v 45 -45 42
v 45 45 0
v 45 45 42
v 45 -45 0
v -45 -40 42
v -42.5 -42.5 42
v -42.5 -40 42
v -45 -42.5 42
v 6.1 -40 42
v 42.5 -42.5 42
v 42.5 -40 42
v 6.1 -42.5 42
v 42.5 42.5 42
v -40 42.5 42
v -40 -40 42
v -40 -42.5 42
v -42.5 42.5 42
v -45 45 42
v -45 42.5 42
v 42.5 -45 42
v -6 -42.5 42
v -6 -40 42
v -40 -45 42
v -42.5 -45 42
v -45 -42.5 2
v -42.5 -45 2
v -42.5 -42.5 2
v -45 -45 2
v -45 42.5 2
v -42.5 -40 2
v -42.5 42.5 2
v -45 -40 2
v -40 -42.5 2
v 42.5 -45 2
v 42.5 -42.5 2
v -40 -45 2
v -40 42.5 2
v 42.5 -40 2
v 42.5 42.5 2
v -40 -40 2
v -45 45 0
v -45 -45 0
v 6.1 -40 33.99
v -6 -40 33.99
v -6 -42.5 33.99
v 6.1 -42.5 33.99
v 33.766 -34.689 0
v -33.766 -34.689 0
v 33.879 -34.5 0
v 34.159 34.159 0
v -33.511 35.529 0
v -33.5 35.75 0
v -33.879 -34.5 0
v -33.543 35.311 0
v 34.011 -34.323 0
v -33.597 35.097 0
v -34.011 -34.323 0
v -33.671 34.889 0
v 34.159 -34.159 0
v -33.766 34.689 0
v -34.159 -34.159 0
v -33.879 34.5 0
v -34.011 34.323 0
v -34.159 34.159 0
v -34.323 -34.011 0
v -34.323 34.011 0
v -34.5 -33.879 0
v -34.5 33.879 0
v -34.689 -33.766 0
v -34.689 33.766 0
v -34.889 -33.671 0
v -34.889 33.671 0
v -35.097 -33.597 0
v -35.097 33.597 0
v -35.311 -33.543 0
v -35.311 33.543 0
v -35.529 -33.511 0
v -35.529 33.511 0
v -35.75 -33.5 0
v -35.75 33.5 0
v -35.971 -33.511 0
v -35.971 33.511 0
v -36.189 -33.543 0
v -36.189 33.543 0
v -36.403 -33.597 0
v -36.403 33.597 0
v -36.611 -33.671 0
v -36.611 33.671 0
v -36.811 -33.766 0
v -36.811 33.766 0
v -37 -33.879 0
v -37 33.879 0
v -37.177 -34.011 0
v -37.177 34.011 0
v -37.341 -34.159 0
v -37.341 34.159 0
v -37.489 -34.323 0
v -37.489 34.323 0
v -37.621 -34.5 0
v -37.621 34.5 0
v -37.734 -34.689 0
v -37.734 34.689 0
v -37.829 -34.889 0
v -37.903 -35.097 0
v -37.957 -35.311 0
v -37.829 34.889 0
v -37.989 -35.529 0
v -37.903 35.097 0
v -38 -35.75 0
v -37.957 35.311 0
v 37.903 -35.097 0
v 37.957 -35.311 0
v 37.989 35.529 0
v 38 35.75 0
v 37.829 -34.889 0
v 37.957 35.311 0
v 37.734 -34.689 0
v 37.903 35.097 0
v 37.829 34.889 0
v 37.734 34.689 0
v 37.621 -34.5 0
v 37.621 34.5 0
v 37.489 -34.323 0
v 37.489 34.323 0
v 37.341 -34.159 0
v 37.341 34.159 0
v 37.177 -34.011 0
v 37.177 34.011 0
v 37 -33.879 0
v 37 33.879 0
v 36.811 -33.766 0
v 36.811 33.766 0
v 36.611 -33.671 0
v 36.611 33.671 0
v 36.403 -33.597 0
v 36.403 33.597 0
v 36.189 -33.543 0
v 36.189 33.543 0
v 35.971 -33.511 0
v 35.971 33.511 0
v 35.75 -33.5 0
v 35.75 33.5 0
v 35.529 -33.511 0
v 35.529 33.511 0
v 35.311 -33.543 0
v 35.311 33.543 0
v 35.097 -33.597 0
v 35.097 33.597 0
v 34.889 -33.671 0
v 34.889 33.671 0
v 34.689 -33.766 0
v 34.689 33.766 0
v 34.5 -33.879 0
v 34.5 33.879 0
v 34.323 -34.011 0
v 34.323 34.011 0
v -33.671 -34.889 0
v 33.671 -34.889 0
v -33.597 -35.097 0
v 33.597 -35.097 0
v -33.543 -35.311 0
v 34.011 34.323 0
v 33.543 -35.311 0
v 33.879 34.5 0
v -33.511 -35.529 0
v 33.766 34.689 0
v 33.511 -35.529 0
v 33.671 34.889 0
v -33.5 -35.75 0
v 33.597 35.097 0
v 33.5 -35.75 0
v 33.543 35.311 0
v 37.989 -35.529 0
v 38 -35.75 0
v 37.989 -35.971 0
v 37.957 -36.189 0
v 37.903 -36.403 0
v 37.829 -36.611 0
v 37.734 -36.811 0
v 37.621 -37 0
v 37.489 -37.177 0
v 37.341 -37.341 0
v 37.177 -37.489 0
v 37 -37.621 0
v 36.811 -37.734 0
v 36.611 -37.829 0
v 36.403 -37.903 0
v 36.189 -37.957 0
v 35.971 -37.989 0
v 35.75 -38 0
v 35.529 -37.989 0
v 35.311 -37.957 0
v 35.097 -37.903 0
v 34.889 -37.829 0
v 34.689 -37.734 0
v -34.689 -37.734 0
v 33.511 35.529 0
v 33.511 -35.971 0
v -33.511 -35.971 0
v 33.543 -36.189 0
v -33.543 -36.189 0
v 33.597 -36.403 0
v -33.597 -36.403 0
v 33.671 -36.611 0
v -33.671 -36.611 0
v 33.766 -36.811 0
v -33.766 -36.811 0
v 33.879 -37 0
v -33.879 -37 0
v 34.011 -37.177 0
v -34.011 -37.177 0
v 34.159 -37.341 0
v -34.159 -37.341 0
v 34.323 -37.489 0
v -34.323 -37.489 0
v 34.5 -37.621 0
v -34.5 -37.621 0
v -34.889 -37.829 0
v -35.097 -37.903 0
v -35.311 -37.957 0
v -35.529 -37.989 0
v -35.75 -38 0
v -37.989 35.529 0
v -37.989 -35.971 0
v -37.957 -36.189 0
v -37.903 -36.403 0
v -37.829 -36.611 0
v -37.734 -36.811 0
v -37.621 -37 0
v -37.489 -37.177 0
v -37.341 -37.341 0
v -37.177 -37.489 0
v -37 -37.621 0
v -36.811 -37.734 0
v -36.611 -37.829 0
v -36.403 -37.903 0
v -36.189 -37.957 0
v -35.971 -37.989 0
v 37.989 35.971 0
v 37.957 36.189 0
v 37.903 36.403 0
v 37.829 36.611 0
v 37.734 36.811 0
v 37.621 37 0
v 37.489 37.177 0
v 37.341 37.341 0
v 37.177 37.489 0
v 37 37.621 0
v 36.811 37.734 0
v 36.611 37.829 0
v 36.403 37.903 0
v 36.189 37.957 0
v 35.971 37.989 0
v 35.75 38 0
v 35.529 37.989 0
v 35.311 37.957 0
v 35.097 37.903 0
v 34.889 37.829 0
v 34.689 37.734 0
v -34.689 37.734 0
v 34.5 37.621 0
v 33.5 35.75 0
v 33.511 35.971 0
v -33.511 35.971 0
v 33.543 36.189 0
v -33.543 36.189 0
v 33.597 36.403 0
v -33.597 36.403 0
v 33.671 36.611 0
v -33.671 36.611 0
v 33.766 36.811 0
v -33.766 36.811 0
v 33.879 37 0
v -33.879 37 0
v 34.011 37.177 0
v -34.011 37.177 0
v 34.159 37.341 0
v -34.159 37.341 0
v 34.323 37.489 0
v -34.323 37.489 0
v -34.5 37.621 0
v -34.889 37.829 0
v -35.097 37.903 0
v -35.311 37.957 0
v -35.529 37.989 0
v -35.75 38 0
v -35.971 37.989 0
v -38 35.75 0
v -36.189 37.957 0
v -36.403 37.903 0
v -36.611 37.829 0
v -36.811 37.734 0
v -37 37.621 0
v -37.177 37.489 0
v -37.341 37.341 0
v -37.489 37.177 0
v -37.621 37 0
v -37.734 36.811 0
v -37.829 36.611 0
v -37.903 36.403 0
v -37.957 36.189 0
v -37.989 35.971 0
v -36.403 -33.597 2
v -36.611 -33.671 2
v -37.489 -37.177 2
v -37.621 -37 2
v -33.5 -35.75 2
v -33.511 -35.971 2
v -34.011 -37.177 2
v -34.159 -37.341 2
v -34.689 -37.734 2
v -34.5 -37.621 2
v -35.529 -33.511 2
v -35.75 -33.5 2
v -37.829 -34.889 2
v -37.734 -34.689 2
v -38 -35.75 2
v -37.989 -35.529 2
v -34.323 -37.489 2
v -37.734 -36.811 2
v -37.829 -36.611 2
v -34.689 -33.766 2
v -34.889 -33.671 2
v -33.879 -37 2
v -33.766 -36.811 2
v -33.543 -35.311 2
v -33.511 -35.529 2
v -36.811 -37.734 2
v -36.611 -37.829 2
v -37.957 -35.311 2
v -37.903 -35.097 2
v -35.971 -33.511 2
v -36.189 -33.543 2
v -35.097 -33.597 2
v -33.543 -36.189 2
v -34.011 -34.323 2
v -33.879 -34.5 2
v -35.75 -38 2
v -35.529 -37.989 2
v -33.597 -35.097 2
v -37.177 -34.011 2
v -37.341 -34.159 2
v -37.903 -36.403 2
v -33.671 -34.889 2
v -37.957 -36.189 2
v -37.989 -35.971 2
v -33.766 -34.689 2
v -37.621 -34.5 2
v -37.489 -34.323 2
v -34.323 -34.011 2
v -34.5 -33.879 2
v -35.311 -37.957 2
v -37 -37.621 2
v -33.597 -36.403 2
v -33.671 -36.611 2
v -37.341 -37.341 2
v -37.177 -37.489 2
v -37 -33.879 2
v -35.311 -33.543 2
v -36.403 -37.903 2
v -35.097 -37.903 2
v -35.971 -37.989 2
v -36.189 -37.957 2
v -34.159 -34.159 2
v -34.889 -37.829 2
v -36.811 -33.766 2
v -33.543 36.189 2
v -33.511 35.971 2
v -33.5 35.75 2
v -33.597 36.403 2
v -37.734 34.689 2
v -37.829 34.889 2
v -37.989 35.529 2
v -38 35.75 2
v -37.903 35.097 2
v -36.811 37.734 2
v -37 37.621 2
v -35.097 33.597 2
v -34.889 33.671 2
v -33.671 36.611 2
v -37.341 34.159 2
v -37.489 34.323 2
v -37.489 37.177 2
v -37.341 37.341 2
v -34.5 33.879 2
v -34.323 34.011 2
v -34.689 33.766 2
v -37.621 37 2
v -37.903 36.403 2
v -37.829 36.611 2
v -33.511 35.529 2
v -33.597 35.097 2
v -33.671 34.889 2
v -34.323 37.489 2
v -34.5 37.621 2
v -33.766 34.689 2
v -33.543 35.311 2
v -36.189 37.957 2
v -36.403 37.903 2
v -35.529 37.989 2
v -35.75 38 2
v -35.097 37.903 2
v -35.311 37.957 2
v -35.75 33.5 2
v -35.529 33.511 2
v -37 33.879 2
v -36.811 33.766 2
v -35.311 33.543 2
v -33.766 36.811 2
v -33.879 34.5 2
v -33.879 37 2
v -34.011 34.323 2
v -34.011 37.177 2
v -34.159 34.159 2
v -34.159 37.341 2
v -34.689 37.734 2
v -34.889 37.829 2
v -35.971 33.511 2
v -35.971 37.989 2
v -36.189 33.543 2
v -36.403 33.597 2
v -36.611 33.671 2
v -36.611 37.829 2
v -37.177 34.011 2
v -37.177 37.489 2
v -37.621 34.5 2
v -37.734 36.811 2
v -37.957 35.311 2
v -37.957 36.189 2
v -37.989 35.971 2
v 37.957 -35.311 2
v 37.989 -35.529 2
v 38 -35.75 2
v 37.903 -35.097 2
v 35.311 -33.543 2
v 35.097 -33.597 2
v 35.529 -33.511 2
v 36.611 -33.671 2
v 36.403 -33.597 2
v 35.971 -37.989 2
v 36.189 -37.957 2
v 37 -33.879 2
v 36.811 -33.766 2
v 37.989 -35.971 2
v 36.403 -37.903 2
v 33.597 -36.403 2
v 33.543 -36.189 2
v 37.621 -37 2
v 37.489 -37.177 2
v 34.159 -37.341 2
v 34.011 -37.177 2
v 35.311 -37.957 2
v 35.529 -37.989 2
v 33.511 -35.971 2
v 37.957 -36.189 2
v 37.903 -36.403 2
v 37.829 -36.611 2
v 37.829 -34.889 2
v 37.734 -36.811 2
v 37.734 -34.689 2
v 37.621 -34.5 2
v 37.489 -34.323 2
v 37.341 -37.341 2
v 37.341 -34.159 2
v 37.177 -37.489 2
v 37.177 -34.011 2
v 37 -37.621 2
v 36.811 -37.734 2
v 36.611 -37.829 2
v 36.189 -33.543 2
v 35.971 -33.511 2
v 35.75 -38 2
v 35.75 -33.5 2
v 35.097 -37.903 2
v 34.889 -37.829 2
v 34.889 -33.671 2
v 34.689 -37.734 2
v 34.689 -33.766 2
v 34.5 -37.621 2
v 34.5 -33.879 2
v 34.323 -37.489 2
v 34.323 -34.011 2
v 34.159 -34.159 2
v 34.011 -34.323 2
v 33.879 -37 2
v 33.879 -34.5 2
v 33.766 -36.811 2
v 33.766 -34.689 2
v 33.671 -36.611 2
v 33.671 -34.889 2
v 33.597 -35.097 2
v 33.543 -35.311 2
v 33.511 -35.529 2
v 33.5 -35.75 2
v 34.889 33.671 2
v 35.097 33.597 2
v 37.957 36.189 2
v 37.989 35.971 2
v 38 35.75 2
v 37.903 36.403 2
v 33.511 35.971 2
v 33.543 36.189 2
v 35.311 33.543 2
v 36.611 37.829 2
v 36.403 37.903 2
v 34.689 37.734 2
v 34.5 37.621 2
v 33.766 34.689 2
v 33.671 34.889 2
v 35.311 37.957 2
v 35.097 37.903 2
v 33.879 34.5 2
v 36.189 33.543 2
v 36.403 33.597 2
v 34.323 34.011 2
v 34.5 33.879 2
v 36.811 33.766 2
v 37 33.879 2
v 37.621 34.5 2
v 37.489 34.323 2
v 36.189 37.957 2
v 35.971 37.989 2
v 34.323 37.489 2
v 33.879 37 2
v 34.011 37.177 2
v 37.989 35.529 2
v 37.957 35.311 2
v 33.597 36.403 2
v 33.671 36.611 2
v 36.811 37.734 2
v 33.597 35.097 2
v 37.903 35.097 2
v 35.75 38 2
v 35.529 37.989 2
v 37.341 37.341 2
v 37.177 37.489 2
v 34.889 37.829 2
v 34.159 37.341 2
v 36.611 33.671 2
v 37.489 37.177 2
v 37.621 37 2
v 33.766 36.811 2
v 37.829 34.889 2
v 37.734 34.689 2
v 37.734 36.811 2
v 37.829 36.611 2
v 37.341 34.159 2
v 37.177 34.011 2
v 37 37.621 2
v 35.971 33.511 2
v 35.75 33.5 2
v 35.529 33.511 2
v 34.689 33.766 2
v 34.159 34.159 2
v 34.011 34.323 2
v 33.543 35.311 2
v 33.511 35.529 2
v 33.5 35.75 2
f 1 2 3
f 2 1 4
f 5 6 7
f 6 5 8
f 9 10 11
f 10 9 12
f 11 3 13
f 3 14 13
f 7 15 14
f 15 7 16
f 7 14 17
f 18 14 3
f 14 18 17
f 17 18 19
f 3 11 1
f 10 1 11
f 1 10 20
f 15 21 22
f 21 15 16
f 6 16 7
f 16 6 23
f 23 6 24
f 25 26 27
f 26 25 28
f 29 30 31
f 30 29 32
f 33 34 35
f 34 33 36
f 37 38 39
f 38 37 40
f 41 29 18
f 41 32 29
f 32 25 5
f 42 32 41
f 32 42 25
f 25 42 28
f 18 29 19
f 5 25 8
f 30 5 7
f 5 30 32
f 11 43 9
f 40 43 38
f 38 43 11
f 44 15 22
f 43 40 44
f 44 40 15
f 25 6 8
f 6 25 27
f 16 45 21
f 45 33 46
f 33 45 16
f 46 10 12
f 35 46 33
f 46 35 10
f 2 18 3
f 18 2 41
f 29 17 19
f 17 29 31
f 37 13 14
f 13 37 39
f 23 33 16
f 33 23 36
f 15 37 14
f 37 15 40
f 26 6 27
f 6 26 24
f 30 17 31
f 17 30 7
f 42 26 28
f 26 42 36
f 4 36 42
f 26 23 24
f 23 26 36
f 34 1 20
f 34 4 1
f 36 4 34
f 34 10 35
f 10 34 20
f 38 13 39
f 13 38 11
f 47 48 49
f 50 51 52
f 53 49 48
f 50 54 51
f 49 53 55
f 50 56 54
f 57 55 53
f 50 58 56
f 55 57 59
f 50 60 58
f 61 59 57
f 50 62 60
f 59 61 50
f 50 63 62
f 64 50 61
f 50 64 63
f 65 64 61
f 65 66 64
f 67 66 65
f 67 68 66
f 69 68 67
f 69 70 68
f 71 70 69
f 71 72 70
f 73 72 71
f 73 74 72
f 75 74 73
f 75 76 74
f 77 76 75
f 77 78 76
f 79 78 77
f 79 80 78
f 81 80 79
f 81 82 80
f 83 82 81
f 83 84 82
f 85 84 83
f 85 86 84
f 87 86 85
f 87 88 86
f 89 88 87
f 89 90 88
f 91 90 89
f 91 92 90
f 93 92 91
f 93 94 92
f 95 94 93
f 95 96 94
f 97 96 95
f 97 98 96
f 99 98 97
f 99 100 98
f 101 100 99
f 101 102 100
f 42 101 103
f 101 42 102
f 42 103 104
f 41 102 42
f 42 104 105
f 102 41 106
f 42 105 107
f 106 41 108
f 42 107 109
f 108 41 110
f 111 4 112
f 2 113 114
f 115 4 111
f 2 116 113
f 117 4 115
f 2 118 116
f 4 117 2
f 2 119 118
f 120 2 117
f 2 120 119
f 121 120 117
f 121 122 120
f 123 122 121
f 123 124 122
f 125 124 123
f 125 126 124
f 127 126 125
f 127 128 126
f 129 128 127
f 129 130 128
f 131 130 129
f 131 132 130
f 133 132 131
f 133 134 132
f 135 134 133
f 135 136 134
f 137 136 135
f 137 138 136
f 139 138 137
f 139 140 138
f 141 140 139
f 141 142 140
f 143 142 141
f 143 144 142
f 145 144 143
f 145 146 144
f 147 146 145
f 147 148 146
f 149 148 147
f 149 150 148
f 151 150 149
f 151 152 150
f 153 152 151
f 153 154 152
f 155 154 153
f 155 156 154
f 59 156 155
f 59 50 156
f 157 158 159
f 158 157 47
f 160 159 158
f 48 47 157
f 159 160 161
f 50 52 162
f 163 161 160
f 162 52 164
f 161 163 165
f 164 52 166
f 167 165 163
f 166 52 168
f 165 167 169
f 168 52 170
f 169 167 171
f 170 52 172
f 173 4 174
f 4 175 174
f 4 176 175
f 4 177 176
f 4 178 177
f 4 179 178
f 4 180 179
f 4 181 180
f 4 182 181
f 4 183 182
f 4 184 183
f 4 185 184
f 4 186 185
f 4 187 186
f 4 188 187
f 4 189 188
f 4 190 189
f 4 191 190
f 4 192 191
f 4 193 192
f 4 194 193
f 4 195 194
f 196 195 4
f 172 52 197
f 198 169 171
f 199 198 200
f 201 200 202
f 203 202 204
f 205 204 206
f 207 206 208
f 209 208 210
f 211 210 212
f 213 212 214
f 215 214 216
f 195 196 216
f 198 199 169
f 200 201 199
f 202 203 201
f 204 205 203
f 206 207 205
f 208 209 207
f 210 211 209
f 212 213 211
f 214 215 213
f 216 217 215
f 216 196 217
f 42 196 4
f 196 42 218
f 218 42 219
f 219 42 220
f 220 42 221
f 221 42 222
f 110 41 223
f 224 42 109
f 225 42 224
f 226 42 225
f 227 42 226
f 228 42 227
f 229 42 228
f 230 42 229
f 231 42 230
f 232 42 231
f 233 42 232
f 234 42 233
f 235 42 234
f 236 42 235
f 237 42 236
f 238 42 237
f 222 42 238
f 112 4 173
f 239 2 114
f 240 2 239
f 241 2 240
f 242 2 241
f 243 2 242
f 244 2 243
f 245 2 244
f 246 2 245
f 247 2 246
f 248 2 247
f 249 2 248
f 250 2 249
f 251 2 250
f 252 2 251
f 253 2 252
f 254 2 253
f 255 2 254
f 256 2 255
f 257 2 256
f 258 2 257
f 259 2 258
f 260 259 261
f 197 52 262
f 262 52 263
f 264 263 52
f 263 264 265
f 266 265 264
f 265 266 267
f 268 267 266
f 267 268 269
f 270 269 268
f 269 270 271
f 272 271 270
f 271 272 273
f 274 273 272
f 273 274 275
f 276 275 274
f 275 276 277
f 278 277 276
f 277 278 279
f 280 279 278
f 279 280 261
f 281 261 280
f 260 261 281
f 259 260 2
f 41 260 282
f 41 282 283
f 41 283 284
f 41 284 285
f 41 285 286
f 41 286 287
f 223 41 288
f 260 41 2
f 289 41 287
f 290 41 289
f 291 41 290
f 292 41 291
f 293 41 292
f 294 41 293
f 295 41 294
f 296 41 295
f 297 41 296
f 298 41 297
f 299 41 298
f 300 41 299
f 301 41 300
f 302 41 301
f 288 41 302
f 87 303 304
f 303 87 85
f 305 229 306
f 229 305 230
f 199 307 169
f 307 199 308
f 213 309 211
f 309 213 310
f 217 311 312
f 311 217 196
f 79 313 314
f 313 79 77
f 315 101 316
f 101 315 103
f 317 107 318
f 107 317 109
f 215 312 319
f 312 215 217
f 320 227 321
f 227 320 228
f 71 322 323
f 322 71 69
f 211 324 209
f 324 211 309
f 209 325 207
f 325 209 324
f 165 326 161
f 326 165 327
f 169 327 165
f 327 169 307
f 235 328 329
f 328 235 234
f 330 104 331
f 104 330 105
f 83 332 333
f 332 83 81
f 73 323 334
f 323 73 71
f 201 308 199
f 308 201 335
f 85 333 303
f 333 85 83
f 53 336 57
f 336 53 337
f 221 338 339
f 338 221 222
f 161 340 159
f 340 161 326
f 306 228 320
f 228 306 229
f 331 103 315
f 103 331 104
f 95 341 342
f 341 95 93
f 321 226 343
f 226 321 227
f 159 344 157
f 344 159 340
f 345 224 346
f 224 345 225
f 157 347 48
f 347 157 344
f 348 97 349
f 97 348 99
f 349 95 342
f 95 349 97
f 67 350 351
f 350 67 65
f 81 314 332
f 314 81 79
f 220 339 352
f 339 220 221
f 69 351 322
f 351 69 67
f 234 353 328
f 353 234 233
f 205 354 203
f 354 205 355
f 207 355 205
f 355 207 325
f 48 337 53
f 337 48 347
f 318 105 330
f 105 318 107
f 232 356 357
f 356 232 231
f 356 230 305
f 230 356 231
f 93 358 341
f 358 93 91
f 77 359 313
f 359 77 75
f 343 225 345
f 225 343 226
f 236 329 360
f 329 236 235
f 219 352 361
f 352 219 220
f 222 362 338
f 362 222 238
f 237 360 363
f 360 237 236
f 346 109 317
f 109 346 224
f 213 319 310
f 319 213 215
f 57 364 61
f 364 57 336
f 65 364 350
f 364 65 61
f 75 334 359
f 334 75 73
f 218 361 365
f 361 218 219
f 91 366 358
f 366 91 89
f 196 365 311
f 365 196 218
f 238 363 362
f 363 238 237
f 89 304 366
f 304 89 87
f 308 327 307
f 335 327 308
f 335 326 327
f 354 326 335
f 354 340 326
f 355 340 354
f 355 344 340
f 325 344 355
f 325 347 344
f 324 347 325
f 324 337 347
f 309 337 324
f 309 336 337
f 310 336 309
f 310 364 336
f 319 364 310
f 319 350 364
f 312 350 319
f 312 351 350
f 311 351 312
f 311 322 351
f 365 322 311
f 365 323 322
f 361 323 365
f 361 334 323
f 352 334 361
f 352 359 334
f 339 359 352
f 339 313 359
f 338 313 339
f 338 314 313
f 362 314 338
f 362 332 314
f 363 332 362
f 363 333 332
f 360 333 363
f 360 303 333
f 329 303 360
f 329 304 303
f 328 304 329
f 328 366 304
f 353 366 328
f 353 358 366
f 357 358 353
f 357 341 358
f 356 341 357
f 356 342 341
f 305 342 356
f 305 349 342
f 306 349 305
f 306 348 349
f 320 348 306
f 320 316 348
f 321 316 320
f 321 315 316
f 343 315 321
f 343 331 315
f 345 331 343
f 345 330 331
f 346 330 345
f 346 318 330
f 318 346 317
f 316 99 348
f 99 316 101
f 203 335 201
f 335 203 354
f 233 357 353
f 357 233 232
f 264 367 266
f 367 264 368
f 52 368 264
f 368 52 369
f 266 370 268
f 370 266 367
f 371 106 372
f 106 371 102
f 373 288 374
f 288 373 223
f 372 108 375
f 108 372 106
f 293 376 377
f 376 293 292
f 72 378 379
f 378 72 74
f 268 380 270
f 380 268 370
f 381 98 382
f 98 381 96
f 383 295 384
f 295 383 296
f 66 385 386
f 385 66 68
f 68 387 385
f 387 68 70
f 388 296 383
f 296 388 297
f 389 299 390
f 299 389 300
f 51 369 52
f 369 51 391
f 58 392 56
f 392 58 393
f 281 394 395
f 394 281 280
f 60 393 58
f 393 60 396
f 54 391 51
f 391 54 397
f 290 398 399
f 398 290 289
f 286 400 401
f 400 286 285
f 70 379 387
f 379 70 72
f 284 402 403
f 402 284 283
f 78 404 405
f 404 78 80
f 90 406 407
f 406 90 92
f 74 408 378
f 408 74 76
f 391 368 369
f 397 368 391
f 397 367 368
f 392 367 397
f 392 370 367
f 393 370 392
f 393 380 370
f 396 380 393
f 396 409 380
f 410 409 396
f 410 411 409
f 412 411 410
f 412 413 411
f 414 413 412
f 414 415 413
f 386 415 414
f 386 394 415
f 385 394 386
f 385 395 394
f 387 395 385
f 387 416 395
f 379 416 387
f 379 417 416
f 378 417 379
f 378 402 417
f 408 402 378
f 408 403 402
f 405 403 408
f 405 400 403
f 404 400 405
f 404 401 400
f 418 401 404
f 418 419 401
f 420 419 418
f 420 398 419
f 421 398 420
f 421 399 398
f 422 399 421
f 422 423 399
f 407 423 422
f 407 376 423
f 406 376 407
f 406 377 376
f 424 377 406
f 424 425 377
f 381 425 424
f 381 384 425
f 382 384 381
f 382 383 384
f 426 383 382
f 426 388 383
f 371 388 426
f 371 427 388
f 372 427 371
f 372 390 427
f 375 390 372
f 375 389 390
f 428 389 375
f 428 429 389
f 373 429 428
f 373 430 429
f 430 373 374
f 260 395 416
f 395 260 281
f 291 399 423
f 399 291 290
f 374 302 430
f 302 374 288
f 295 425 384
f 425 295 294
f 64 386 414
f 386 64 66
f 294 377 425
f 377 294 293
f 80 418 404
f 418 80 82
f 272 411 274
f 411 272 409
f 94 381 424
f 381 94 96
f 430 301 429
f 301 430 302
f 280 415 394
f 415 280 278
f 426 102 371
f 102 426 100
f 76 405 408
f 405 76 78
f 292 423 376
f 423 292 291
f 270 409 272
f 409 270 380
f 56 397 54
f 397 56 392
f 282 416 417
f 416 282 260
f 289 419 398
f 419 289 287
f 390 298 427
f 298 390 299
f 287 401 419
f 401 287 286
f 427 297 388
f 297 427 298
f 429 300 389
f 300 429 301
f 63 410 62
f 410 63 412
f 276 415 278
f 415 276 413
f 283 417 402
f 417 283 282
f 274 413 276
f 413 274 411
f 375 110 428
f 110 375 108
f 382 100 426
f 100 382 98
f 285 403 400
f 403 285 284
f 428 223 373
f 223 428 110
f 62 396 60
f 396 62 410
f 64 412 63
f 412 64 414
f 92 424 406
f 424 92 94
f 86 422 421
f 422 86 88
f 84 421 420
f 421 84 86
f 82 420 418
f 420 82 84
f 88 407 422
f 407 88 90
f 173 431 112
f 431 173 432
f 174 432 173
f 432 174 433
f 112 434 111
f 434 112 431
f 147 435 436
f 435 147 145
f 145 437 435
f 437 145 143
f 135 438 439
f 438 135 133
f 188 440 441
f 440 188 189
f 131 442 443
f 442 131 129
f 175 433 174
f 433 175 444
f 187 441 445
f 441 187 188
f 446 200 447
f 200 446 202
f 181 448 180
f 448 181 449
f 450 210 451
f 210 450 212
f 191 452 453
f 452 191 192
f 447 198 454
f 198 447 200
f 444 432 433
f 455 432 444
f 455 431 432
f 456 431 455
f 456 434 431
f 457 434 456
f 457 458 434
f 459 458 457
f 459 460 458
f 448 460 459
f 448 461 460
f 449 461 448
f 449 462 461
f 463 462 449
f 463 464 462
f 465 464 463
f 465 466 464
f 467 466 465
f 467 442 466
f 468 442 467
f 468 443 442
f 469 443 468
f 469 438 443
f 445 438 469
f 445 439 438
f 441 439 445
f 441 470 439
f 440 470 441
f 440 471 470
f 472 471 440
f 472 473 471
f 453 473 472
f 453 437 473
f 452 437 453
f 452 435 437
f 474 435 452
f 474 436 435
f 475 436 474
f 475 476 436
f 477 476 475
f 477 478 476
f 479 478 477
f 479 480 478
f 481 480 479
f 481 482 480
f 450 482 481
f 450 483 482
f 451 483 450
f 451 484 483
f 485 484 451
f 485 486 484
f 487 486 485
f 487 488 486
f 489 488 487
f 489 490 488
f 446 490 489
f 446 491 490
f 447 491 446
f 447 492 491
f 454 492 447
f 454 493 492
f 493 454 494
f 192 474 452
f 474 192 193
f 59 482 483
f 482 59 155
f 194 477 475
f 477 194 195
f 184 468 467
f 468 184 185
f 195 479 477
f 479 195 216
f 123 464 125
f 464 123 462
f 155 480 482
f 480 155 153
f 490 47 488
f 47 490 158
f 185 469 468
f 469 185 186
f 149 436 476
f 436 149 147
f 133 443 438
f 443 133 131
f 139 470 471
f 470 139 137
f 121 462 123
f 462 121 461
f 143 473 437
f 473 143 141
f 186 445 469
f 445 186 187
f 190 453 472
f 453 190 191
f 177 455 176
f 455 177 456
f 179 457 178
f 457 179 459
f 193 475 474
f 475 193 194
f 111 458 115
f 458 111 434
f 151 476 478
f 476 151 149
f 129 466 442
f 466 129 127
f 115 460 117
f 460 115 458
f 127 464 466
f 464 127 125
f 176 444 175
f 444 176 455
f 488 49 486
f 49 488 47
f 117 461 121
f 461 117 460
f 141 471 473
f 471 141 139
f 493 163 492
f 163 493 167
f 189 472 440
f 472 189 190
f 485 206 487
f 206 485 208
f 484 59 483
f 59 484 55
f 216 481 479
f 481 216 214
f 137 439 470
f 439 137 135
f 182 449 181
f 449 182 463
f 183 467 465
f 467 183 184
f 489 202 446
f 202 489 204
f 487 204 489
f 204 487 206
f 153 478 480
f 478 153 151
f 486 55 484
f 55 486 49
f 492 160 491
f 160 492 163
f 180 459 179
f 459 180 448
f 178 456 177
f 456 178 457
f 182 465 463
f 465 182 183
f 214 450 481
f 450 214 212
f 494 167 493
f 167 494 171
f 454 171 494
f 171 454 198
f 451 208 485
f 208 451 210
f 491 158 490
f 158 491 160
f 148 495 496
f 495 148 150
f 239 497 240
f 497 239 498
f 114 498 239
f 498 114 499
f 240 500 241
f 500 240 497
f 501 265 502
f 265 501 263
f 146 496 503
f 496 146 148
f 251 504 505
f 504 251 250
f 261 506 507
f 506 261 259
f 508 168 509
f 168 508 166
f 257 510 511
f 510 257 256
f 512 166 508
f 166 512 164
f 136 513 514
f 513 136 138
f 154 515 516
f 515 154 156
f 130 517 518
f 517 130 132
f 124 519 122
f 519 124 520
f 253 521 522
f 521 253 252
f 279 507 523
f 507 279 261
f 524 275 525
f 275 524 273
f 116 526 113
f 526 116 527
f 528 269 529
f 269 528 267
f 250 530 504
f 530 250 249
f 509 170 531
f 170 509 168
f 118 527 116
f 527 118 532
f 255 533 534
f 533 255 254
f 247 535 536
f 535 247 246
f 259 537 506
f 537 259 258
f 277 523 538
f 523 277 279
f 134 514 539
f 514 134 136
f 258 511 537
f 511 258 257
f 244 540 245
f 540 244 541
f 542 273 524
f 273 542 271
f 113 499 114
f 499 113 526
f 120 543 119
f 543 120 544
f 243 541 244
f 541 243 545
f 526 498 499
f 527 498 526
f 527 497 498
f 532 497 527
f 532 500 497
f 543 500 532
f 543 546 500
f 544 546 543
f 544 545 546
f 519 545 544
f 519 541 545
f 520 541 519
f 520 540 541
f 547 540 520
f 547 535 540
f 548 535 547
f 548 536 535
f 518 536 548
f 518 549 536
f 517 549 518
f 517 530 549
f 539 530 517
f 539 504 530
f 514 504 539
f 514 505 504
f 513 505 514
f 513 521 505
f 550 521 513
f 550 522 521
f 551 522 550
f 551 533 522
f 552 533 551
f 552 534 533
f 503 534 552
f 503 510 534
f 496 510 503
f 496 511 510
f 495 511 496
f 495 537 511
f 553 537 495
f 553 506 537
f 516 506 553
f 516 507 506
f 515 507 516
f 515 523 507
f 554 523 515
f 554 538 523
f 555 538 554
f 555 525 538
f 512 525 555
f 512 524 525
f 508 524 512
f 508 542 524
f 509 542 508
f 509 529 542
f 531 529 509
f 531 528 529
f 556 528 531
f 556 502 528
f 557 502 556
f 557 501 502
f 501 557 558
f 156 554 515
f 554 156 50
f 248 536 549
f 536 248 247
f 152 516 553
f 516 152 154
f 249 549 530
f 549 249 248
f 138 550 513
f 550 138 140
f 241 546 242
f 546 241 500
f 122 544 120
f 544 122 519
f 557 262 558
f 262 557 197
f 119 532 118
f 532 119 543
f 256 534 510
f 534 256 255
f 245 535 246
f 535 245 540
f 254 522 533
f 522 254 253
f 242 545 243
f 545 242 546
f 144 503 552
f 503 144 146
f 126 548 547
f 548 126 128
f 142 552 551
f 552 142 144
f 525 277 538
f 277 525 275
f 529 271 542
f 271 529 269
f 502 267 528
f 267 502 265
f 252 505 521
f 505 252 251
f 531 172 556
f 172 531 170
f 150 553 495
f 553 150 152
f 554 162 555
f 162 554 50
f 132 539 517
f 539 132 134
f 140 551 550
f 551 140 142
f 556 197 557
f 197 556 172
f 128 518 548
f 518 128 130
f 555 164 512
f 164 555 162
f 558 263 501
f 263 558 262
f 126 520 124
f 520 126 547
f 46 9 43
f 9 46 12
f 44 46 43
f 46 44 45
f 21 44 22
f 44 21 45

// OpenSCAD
// Dimensions
outer_size = 90;          // outer X/Y size in mm
wall_thickness = 2.5;     // wall thickness in mm
top_thickness = 2;        // top plate thickness in mm
height = 40;              // total height from top plate to open top
hole_pattern_size = 71.5; // screw hole pattern square size in mm
hole_diameter = 4.5;      // screw hole diameter in mm
notch_width = 12;         // notch width in mm
notch_depth = 8;          // notch depth from top (40 - 32) in mm

// Derived dimensions
inner_size = outer_size - 2 * wall_thickness;
hole_offset = hole_pattern_size / 2;

// Top plate - centered at origin, at z=0 to 2
module top_plate() {
    translate([-outer_size/2, -outer_size/2, 0])
        cube([outer_size, outer_size, top_thickness]);
}

// Walls - on top of top plate, from z=2 to z=42
module walls() {
    // Front wall (Y negative side)
    translate([-outer_size/2, -inner_size/2, top_thickness])
        cube([outer_size, wall_thickness, height]);
    
    // Back wall (Y positive side)
    translate([-outer_size/2, inner_size/2, top_thickness])
        cube([outer_size, wall_thickness, height]);
    
    // Left wall (X negative side)
    translate([-inner_size/2, -outer_size/2, top_thickness])
        cube([wall_thickness, outer_size, height]);
    
    // Right wall (X positive side)
    translate([inner_size/2, -outer_size/2, top_thickness])
        cube([wall_thickness, outer_size, height]);
}

// Screw holes - through the top plate
module screw_holes() {
    for (x = [-1, 1]) {
        for (y = [-1, 1]) {
            translate([x * hole_offset, y * hole_offset, -0.01])
                cylinder(h = top_thickness + 0.02, r = hole_diameter/2, $fn = 64);
        }
    }
}

// Notch for power cable - in front wall (Y negative side)
module notch() {
    // Notch centered on front wall, 12mm wide, 8mm deep from top (z=34 to 42)
    translate([-notch_width/2, -inner_size/2, height + top_thickness - notch_depth])
        cube([notch_width + 0.1, wall_thickness + 0.1, notch_depth + 0.02]);
}

// Assemble the housing
module housing() {
    union() {
        top_plate();
        walls();
    }
}

// Subtract screw holes
module housing_with_holes() {
    difference() {
        housing();
        translate([0, 0, -0.01])
            screw_holes();
    }
}

// Subtract notch
module final_housing() {
    difference() {
        housing_with_holes();
        translate([0, 0, -0.01])
            notch();
    }
}

// Render
final_housing();
